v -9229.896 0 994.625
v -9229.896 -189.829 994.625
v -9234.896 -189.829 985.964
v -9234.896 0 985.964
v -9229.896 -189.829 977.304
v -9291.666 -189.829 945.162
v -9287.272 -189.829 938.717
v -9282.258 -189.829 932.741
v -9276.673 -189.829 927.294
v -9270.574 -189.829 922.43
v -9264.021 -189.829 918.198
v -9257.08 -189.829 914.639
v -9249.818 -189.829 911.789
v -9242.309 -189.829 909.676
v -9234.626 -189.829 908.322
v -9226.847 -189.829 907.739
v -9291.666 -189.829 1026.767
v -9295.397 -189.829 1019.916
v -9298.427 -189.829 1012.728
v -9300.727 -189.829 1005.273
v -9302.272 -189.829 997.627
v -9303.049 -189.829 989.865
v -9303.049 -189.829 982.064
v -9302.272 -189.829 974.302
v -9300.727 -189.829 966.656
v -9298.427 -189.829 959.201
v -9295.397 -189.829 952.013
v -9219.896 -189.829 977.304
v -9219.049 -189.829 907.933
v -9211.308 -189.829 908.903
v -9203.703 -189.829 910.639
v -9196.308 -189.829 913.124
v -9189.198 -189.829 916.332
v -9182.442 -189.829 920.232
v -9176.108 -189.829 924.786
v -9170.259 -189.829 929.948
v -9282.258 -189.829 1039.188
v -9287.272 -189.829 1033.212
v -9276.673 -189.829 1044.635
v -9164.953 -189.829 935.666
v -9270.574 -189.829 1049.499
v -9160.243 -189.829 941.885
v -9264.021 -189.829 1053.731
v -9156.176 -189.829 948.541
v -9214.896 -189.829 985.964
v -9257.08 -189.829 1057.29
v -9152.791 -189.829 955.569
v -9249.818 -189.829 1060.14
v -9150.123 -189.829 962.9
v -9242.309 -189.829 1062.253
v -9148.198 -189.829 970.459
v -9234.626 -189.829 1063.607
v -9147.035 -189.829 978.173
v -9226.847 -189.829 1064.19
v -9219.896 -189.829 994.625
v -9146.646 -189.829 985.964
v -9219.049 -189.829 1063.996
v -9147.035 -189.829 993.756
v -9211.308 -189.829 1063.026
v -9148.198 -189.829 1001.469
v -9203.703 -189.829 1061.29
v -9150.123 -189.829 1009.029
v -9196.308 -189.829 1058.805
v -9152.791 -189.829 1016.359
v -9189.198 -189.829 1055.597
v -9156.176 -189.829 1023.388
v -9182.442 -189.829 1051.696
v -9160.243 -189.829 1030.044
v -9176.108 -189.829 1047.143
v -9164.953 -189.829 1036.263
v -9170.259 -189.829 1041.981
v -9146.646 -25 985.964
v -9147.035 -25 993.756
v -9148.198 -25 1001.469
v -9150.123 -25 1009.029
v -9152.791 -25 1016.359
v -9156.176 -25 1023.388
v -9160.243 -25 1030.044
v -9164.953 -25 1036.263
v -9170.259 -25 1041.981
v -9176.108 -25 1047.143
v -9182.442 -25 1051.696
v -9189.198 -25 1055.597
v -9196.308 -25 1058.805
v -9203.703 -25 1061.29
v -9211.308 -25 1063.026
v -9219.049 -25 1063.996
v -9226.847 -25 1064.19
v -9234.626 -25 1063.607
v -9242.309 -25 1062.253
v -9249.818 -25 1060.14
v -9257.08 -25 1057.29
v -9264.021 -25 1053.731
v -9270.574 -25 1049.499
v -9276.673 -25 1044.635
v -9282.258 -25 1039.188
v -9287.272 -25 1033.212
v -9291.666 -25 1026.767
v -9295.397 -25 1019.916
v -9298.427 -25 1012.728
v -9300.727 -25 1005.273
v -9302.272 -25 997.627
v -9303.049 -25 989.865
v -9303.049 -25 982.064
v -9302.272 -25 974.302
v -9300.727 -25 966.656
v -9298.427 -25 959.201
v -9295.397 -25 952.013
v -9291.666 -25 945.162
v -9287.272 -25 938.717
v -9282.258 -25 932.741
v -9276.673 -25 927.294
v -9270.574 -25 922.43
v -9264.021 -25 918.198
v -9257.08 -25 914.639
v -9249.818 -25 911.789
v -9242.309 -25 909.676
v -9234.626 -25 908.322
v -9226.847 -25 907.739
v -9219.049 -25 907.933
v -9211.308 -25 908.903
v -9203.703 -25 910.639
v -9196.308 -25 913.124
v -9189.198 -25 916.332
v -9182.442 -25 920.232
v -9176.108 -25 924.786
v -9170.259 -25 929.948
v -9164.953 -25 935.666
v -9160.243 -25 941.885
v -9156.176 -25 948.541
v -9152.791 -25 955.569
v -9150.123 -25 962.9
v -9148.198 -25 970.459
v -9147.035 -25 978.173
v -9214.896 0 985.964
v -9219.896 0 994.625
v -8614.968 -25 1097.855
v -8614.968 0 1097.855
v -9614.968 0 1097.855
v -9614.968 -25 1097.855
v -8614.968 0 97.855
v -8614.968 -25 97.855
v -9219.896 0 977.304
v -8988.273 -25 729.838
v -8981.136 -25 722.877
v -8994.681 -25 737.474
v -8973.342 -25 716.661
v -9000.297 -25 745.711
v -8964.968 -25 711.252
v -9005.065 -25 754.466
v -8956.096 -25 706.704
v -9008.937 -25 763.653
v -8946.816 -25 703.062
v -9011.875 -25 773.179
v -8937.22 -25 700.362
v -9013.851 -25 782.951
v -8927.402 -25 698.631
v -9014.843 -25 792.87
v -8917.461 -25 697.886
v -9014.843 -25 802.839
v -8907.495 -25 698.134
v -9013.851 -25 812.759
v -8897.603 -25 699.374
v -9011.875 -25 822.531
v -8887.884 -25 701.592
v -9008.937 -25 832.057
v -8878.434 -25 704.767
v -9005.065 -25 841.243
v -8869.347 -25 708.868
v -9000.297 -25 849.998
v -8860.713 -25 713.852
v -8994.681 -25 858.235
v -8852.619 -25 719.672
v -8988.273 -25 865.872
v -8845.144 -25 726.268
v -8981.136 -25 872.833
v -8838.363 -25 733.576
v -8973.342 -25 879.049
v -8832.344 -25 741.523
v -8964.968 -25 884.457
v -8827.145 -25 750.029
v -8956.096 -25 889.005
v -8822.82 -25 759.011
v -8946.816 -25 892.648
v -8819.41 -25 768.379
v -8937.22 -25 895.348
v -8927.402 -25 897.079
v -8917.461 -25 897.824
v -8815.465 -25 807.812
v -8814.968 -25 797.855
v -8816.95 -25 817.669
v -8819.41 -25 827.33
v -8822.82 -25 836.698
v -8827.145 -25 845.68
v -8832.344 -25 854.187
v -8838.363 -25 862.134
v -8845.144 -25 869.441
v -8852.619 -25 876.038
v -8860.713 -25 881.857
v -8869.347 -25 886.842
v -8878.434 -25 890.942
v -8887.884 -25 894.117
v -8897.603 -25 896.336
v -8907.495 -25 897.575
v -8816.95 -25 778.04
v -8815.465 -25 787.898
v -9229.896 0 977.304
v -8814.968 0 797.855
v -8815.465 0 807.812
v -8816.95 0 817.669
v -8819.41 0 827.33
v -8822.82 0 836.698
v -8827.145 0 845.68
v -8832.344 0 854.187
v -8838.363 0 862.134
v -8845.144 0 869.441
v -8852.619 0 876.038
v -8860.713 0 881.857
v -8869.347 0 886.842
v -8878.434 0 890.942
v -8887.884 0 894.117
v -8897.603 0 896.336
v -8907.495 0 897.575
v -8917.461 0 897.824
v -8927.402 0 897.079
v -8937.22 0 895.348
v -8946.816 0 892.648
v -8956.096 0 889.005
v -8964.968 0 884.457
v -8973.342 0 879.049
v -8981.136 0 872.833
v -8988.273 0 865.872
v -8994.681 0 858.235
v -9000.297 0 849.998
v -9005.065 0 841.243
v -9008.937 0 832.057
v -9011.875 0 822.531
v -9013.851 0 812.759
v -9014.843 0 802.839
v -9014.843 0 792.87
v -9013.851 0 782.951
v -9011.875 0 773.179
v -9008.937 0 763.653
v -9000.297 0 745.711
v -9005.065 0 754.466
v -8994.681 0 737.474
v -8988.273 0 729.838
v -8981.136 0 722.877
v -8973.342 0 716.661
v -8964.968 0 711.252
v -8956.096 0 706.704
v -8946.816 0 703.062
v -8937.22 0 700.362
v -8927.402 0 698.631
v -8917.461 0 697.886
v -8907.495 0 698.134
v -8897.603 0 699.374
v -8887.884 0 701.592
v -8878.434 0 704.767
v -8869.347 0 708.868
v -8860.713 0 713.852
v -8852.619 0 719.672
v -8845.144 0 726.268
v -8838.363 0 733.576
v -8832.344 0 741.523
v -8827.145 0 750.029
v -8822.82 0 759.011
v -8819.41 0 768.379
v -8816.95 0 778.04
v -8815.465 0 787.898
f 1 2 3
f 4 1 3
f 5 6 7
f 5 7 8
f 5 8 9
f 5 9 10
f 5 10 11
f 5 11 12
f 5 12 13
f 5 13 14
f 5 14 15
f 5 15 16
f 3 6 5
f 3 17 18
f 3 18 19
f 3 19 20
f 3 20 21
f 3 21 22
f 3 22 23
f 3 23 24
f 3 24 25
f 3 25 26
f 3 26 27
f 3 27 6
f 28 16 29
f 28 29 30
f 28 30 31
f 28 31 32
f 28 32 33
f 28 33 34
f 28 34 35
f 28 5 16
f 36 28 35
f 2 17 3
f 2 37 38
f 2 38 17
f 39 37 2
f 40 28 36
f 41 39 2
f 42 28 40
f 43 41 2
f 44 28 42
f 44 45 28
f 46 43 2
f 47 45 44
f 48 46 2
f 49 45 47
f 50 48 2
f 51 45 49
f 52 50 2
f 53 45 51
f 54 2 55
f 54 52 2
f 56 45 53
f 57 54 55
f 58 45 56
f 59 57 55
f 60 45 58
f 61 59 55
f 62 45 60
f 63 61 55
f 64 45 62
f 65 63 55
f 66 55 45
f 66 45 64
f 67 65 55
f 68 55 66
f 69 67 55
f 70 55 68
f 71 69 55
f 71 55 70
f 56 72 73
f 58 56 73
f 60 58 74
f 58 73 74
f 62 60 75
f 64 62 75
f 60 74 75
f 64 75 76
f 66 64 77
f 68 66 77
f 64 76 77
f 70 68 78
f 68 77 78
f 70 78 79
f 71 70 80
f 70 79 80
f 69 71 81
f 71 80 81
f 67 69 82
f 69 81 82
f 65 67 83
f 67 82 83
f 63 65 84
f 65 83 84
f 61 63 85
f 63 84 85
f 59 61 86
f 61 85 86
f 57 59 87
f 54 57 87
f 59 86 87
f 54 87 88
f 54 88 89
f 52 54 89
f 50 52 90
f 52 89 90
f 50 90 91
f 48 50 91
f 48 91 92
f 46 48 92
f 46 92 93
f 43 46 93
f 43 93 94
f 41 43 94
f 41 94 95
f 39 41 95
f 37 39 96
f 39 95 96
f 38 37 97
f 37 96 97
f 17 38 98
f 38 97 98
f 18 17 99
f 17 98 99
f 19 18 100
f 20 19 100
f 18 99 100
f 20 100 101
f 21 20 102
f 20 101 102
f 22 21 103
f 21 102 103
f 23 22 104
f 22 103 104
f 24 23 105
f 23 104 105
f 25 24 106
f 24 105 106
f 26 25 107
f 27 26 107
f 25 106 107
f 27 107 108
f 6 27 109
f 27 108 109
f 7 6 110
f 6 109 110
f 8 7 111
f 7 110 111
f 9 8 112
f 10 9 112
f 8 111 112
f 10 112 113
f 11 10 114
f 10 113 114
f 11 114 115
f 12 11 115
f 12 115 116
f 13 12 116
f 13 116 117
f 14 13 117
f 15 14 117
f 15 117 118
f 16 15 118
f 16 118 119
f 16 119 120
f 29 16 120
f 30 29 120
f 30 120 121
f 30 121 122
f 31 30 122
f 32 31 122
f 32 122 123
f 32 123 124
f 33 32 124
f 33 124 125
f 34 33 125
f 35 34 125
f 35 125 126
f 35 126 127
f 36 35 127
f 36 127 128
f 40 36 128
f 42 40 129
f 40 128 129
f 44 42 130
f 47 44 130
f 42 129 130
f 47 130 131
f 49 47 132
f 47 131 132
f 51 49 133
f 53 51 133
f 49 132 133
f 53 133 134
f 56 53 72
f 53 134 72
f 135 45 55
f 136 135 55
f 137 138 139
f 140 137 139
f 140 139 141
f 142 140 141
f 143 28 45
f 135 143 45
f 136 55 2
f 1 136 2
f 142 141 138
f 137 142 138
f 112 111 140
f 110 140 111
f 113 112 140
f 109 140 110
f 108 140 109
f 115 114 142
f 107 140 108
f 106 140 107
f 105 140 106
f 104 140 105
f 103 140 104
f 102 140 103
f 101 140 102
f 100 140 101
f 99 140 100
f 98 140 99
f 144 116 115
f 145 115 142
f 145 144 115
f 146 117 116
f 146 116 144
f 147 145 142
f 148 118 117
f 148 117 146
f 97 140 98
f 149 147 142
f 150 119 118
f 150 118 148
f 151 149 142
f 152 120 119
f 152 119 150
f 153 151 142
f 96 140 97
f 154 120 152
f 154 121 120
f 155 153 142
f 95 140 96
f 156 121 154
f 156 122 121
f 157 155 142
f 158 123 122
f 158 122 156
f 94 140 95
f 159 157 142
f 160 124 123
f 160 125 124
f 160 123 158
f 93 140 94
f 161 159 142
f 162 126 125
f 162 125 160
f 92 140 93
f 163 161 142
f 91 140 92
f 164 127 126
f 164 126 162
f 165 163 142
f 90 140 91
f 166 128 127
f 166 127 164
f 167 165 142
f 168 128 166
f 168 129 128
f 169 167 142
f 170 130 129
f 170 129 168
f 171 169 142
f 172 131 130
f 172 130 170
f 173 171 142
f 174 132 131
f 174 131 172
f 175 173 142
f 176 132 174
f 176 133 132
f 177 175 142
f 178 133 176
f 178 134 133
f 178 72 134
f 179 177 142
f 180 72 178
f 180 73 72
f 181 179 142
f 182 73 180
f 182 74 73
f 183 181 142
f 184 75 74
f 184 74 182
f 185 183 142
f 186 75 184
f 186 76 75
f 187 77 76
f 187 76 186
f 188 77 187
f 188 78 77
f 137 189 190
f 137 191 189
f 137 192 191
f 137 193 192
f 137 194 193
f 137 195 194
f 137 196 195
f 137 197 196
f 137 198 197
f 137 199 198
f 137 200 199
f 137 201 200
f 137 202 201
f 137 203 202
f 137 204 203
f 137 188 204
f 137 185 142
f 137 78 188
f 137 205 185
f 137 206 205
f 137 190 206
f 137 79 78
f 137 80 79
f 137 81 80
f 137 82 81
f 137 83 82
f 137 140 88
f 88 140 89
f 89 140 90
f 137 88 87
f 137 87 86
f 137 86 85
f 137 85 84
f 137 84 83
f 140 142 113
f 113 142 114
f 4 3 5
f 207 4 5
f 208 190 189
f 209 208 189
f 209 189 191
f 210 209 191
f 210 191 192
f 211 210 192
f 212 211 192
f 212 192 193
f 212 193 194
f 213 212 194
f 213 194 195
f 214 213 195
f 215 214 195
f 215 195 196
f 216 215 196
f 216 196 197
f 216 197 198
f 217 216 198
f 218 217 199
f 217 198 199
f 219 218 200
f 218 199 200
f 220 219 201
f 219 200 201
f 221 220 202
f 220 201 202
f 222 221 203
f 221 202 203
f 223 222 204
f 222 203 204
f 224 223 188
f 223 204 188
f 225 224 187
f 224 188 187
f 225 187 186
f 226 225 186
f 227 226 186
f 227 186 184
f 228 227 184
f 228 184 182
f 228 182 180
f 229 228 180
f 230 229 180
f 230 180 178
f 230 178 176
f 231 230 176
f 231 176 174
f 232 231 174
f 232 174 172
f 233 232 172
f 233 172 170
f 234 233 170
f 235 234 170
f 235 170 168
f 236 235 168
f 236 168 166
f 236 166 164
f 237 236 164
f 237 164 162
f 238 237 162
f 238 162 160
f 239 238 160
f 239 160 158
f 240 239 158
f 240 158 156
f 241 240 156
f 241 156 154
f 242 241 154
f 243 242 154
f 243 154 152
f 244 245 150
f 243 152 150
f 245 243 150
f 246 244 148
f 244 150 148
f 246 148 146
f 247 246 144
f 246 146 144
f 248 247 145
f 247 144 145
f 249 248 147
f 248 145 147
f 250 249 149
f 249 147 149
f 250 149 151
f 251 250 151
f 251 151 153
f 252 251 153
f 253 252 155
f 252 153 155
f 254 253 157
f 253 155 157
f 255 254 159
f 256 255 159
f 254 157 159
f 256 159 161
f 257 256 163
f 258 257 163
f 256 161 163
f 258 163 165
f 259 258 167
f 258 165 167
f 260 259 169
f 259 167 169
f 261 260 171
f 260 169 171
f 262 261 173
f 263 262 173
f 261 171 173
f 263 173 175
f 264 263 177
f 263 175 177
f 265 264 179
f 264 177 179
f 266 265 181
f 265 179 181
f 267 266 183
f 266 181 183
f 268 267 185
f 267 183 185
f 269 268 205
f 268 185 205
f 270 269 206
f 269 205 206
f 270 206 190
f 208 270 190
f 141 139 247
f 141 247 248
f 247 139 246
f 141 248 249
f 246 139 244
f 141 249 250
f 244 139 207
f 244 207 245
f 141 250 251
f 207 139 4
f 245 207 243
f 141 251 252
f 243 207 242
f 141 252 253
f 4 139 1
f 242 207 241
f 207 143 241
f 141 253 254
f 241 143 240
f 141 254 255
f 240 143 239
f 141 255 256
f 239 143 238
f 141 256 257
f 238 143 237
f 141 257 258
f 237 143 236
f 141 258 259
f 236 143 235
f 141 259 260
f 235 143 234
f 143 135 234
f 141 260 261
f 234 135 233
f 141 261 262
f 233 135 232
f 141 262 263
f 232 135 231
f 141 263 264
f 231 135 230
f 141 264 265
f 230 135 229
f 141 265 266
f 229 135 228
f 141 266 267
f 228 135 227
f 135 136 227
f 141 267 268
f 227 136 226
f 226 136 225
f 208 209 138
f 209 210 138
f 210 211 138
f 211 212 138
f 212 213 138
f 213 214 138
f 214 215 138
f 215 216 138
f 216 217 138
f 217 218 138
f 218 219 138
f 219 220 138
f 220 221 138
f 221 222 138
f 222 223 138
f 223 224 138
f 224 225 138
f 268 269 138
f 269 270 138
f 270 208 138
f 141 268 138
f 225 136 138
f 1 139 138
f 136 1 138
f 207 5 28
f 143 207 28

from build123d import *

# Parameters (mm, degrees)
F1_DEPTH = 25
F2_R     = 100
F3_DEPTH = 25.001
F4_R     = 78.250027
F5_DEPTH = 164.82871
F7_DEPTH = 189.82971


with BuildPart() as f1:
    # F0 (on Front) → F1 (new body)
    with BuildSketch(Plane.XZ):
        Polygon((-8614.96765, 1097.854802), (-9614.96765, 1097.854802), (-8614.96765, 97.854802), align=None)
    extrude(amount=F1_DEPTH)

    # F2 (on face) → F3 (cut, through all)
    with BuildSketch(Plane.XZ.offset(25)):
        with Locations((-8914.96765, 797.854802)):
            Circle(F2_R)
    extrude(amount=-F3_DEPTH, mode=Mode.SUBTRACT)

    # F4 (on face) → F5 (join)
    with BuildSketch(Plane.XZ.offset(25)):
        with Locations((-9224.896431, 985.964417)):
            Circle(F4_R)
    extrude(amount=F5_DEPTH)

    # F6 (on face) → F7 (cut, through all)
    with BuildSketch(Plane.XZ.offset(189.82871)):
        Polygon((-9229.896431, 977.304163), (-9219.896431, 977.304163), (-9214.896431, 985.964417), (-9219.896431, 994.624671), (-9229.896431, 994.624671), (-9234.896431, 985.964417), align=None)
    extrude(amount=-F7_DEPTH, mode=Mode.SUBTRACT)


solid = f1.part
